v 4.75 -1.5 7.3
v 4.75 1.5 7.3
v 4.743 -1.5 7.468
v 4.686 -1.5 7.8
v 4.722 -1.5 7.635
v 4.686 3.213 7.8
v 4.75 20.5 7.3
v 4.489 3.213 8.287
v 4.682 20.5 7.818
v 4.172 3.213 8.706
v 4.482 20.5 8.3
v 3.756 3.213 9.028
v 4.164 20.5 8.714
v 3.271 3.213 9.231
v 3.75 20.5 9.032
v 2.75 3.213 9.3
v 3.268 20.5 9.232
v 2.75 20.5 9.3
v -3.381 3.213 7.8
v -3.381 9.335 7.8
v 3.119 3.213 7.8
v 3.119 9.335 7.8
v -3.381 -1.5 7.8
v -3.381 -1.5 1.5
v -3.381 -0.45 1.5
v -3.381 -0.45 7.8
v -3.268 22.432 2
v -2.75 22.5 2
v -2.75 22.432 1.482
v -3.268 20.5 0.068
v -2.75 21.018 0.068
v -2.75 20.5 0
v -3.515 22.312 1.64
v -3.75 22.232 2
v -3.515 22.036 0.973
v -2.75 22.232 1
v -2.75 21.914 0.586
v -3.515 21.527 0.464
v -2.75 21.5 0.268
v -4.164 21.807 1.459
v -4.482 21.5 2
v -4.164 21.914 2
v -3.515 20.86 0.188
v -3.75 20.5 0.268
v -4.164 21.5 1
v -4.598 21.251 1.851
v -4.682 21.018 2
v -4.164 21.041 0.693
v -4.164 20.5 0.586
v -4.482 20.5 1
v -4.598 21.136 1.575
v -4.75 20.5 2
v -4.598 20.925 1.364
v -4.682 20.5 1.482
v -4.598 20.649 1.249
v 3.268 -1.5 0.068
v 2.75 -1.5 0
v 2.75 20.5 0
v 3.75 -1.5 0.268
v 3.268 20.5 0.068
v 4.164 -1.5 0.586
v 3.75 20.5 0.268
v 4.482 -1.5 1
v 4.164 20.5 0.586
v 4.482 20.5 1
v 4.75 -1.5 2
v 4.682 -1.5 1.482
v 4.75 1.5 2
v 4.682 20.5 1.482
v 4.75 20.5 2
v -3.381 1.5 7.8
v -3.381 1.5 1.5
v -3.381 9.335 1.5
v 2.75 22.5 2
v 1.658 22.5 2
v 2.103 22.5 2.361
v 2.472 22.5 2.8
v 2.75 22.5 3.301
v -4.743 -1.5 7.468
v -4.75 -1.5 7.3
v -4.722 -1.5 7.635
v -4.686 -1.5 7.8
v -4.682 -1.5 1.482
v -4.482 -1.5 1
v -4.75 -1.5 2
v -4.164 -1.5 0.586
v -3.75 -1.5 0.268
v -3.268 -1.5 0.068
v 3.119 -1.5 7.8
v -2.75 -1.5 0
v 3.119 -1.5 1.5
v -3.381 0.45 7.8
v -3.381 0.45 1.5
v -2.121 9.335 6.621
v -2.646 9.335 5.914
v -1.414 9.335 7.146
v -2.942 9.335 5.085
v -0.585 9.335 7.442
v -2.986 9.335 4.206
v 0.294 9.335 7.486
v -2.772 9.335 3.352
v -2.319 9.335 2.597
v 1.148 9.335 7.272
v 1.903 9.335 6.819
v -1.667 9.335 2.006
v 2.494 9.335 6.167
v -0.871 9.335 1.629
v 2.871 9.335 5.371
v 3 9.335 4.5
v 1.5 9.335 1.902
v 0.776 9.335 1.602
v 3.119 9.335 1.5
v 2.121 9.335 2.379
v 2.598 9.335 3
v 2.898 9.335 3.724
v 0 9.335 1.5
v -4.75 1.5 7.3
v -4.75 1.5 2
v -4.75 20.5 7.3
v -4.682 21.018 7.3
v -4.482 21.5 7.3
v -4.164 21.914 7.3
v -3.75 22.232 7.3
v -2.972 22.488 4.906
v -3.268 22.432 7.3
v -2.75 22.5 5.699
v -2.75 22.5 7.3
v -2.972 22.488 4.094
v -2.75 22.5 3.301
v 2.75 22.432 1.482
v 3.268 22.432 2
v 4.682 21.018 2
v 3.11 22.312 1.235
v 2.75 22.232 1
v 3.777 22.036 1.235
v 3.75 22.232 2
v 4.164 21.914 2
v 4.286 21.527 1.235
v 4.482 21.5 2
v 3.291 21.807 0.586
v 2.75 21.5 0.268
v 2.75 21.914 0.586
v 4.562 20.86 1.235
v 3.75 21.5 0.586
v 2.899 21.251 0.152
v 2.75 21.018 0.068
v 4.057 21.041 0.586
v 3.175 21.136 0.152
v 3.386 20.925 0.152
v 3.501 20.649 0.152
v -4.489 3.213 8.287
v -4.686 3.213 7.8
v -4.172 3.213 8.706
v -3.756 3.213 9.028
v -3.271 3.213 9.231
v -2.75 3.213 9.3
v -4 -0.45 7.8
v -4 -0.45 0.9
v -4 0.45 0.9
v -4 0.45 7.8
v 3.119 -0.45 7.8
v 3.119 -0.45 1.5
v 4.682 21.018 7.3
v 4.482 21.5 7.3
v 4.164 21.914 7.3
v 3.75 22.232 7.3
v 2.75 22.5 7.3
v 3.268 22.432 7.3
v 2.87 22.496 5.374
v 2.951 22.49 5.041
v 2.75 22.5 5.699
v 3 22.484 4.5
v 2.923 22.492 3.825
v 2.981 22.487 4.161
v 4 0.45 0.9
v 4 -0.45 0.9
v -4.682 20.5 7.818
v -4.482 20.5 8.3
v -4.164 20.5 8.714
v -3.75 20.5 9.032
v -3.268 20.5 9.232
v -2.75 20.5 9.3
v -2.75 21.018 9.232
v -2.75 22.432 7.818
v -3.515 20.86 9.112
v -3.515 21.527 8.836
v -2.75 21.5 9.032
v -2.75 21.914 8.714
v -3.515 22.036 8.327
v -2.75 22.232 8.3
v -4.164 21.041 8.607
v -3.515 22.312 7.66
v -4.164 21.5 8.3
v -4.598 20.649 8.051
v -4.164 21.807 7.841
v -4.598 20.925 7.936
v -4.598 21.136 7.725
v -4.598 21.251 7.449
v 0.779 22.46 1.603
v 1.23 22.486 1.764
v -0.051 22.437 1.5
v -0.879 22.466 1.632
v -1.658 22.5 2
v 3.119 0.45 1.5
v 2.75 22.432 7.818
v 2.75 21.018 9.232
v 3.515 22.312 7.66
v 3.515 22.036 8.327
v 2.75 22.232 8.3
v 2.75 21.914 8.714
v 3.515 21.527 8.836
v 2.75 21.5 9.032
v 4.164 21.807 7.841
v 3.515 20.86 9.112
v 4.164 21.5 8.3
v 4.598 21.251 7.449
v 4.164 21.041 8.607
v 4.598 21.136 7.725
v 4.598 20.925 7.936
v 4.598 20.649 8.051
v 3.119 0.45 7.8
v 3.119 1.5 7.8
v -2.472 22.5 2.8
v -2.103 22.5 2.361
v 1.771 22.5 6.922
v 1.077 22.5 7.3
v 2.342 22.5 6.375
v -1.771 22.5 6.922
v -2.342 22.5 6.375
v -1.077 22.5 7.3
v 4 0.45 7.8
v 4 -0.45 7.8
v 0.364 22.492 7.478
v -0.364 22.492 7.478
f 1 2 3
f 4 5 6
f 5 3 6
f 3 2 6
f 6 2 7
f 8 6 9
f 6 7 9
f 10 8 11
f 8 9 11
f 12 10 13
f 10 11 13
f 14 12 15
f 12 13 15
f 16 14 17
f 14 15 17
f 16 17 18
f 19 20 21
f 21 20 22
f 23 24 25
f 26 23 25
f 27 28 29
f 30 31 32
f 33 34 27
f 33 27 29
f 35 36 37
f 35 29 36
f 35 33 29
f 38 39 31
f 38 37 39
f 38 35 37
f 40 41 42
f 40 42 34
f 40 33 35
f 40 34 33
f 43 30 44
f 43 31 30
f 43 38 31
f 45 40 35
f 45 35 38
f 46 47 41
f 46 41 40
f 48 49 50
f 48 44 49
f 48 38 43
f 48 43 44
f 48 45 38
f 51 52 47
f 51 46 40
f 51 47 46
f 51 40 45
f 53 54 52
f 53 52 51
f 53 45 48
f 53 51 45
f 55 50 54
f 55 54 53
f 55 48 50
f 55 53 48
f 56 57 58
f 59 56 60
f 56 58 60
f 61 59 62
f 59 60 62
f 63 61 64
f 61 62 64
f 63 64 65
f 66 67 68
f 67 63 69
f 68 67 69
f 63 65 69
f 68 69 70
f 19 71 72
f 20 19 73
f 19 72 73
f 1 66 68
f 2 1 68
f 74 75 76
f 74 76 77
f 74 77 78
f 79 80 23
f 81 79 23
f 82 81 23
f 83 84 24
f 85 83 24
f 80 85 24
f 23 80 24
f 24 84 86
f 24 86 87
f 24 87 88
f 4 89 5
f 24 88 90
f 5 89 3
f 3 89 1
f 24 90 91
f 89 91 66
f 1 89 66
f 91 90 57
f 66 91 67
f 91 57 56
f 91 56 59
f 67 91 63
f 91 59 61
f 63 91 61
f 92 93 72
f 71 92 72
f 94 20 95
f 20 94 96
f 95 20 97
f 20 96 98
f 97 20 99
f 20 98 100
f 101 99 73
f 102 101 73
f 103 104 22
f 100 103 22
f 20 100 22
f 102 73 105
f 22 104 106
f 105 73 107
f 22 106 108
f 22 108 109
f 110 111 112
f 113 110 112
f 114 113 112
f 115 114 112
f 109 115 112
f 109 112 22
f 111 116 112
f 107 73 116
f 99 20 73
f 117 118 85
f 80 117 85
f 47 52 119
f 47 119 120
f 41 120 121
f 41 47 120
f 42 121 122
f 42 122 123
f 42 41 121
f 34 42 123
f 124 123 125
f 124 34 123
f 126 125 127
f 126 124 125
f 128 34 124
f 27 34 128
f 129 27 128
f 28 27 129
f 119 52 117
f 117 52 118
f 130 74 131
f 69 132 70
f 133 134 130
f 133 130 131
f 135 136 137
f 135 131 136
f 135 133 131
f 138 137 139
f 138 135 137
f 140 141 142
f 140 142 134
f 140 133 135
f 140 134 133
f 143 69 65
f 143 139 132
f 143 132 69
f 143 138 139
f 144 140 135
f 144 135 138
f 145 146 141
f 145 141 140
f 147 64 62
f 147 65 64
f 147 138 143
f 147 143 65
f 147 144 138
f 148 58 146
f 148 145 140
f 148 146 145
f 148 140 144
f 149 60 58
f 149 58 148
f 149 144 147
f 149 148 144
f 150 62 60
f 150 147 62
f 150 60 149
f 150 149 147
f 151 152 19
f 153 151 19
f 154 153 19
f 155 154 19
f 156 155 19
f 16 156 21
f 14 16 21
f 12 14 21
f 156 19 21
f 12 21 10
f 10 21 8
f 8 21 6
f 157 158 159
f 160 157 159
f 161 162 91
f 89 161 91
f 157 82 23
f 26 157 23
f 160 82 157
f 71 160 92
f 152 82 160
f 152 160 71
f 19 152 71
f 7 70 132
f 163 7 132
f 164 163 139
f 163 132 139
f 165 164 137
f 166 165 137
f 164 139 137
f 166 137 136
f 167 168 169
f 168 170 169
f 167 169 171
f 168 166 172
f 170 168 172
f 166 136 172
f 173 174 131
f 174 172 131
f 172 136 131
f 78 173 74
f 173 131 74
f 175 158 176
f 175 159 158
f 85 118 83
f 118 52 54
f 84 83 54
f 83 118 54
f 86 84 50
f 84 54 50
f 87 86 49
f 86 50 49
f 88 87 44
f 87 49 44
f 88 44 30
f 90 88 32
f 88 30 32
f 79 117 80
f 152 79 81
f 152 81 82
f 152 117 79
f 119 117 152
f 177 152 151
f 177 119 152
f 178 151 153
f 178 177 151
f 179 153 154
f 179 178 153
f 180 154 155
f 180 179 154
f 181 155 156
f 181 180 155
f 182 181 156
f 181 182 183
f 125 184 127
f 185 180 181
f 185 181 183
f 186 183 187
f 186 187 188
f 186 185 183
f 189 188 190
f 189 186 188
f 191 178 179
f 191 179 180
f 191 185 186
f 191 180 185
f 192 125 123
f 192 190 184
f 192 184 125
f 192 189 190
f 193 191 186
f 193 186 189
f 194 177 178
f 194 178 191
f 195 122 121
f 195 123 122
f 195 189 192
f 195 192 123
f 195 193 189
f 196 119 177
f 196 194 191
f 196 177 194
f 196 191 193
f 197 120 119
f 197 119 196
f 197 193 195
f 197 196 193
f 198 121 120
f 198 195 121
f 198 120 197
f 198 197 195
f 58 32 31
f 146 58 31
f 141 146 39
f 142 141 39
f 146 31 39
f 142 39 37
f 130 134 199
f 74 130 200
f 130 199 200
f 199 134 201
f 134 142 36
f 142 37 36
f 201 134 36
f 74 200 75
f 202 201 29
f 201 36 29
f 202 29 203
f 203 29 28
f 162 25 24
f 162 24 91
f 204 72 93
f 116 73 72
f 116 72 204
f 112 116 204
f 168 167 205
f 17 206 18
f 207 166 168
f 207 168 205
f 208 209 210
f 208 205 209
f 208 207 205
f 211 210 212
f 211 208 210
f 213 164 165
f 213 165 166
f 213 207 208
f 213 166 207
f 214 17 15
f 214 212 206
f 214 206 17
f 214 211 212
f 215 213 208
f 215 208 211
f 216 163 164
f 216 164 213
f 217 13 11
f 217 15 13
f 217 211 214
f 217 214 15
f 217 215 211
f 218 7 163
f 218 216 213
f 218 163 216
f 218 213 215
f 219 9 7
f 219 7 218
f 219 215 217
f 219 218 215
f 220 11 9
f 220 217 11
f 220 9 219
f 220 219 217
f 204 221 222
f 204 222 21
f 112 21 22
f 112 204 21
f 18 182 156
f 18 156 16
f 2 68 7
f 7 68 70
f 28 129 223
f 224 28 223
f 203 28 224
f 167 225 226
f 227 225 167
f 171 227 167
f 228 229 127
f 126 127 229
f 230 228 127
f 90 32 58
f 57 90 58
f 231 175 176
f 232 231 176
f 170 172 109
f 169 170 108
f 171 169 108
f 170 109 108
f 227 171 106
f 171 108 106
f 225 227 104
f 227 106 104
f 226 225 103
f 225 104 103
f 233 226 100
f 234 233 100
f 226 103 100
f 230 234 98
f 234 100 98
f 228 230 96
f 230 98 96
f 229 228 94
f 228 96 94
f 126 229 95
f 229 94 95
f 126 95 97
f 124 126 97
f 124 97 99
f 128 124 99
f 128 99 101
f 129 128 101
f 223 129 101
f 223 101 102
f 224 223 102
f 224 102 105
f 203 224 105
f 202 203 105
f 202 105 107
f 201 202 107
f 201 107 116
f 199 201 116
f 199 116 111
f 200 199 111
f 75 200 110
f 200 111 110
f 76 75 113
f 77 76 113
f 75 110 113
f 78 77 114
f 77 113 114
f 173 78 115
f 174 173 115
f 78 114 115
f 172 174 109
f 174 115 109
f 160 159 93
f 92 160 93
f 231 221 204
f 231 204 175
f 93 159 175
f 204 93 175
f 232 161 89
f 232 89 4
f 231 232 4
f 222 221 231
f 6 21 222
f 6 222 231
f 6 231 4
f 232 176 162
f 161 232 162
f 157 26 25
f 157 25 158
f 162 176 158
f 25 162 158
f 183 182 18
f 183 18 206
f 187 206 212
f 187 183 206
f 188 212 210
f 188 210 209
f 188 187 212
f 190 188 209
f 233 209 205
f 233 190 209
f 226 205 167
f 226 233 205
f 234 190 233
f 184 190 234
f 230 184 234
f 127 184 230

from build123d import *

# Parameters (mm, degrees)
F0_W         = 1.3692331631
F0_H         = 7.834737435
F0_W_2       = 6.5
F0_H_2       = 0.9
F0_W_3       = 0.6192331631
F0_H_3       = 1.05
F0_H_4       = 13.165262565
F0_W_4       = 0.8807668369
F0_W_5       = 1.6307668369
F1_DEPTH     = 0.9
F2_DEPTH     = 1.5
F3_DEPTH     = 7.8
F5_W         = 9.5
F5_H         = 19.2867757659
F6_DEPTH     = 1.5
F7_R         = 3
F8_DEPTH     = 22.501
F9_T1_DEPTH  = 5.3
F9_T3_DEPTH  = 5.5
F9_T5_DEPTH  = 22.2867757659
F9_T7_DEPTH  = 27
F9_S11_W     = 2
F9_S11_H     = 2
F9_T12_DEPTH = 2
F9_S17_W     = 2
F9_S17_H     = 2
F9_T18_DEPTH = 2
F9_S23_W     = 2
F9_S23_H     = 2
F9_T24_DEPTH = 2
F9_S29_W     = 2
F9_S29_H     = 2
F9_T30_DEPTH = 2


# Not quite as in the source:
# - a fillet or chamfer that OpenCascade refuses, or shapes differently, is made with other operations: its cross-section is extruded or revolved along the edge and cut away or added
# - a feature names something its author has since deleted; it is built from what else it names


with BuildPart() as f1:
    # F0 (on Top) → F1 (new body)
    with BuildSketch(Plane.XY):
        Polygon((-4.75, 1.5), (-4.75, -1.5), (-3.3807668369, -1.5), (-3.3807668369, -0.45), (-4, -0.45), (-4, 0.45), (-3.3807668369, 0.45), (-3.3807668369, 1.5), align=None)
        Polygon((-3.3807668369, -0.45), (-3.3807668369, -1.5), (-3.1192331631, -1.5), (3.1192331631, -1.5), (3.1192331631, -0.45), align=None)
        with Locations((-4.0653834185, 5.4173687175)):
            Rectangle(F0_W, F0_H)
        with Locations((-0.1307668369, 0)):
            Rectangle(F0_W_2, F0_H_2)
        with Locations((-3.6903834185, 0)):
            Rectangle(F0_W_3, F0_H_2)
        with Locations((-0.1307668369, 5.4173687175)):
            Rectangle(F0_W_2, F0_H)
        with Locations((-0.1307668369, 0.975)):
            Rectangle(F0_W_2, F0_H_3)
        with Locations((-4.0653834185, 15.9173687175)):
            Rectangle(F0_W, F0_H_4)
        Polygon((3.1192331631, -0.45), (3.1192331631, -1.5), (3.3807668369, -1.5), (4.75, -1.5), (4.75, 1.5), (3.1192331631, 1.5), (3.1192331631, 0.45), (4, 0.45), (4, -0.45), align=None)
        with Locations((3.5596165815, 0)):
            Rectangle(F0_W_4, F0_H_2)
        with Locations((3.9346165815, 5.4173687175)):
            Rectangle(F0_W_5, F0_H)
        with Locations((-0.1307668369, 15.9173687175)):
            Rectangle(F0_W_2, F0_H_4)
        with Locations((3.9346165815, 15.9173687175)):
            Rectangle(F0_W_5, F0_H_4)
    extrude(amount=F1_DEPTH)

    # F0 (on Top) → F2 (join)
    with BuildSketch(Plane.XY):
        Polygon((-3.3807668369, -0.45), (-3.3807668369, -1.5), (-3.1192331631, -1.5), (3.1192331631, -1.5), (3.1192331631, -0.45), align=None)
        Polygon((3.1192331631, -0.45), (3.1192331631, -1.5), (3.3807668369, -1.5), (4.75, -1.5), (4.75, 1.5), (3.1192331631, 1.5), (3.1192331631, 0.45), (4, 0.45), (4, -0.45), align=None)
        Polygon((-4.75, 1.5), (-4.75, -1.5), (-3.3807668369, -1.5), (-3.3807668369, -0.45), (-4, -0.45), (-4, 0.45), (-3.3807668369, 0.45), (-3.3807668369, 1.5), align=None)
        with Locations((-0.1307668369, 0.975)):
            Rectangle(F0_W_2, F0_H_3)
        with Locations((-4.0653834185, 5.4173687175)):
            Rectangle(F0_W, F0_H)
        with Locations((3.9346165815, 5.4173687175)):
            Rectangle(F0_W_5, F0_H)
        with Locations((-0.1307668369, 5.4173687175)):
            Rectangle(F0_W_2, F0_H)
        with Locations((-4.0653834185, 15.9173687175)):
            Rectangle(F0_W, F0_H_4)
        with Locations((-0.1307668369, 15.9173687175)):
            Rectangle(F0_W_2, F0_H_4)
        with Locations((3.9346165815, 15.9173687175)):
            Rectangle(F0_W_5, F0_H_4)
    extrude(amount=F2_DEPTH)

    # F0 (on Top) → F3 (join)
    with BuildSketch(Plane.XY):
        Polygon((-4.75, 1.5), (-4.75, -1.5), (-3.3807668369, -1.5), (-3.3807668369, -0.45), (-4, -0.45), (-4, 0.45), (-3.3807668369, 0.45), (-3.3807668369, 1.5), align=None)
        Polygon((3.1192331631, -0.45), (3.1192331631, -1.5), (3.3807668369, -1.5), (4.75, -1.5), (4.75, 1.5), (3.1192331631, 1.5), (3.1192331631, 0.45), (4, 0.45), (4, -0.45), align=None)
        with Locations((-4.0653834185, 5.4173687175)):
            Rectangle(F0_W, F0_H)
        with Locations((3.9346165815, 5.4173687175)):
            Rectangle(F0_W_5, F0_H)
        with Locations((-4.0653834185, 15.9173687175)):
            Rectangle(F0_W, F0_H_4)
        with Locations((-0.1307668369, 15.9173687175)):
            Rectangle(F0_W_2, F0_H_4)
        with Locations((3.9346165815, 15.9173687175)):
            Rectangle(F0_W_5, F0_H_4)
    extrude(amount=F3_DEPTH)

    # F5 (on offset) → F6 (join)
    with BuildSketch(Plane.XY.offset(7.8)):
        with Locations((0, 12.856612117)):
            Rectangle(F5_W, F5_H)
    extrude(amount=F6_DEPTH)

    # F7 (on Front) → F8 (cut, through all)
    with BuildSketch(Plane.XZ):
        with Locations((0, 4.5)):
            Circle(F7_R)
    extrude(amount=-F8_DEPTH, mode=Mode.SUBTRACT)

    # F9: fillet of radius 2 on 8 edges, made by hand

    # F9_s2 → F9_t1 (cut)
    with BuildSketch(Plane.XY.offset(2)):
        with BuildLine():
            ThreePointArc((4.75, 20.5), (4.1642135624, 21.9142135624), (2.75, 22.5))
            Line((2.75, 22.5), (4.75, 22.5))
            Line((4.75, 22.5), (4.75, 20.5))
        make_face()
        with BuildLine():
            ThreePointArc((-4.75, 20.5), (-4.1642135624, 21.9142135624), (-2.75, 22.5))
            Line((-2.75, 22.5), (-4.75, 22.5))
            Line((-4.75, 22.5), (-4.75, 20.5))
        make_face()
    extrude(amount=F9_T1_DEPTH, mode=Mode.SUBTRACT)

    # F9_s4 → F9_t3 (cut)
    with BuildSketch(Plane.YZ.offset(-2.75)):
        with BuildLine():
            ThreePointArc((20.5, 9.3), (21.9142135624, 8.7142135624), (22.5, 7.3))
            Line((22.5, 7.3), (22.5, 9.3))
            Line((22.5, 9.3), (20.5, 9.3))
        make_face()
        with BuildLine():
            ThreePointArc((20.5, 0), (21.9142135624, 0.5857864376), (22.5, 2))
            Line((22.5, 2), (22.5, 0))
            Line((22.5, 0), (20.5, 0))
        make_face()
    extrude(amount=F9_T3_DEPTH, mode=Mode.SUBTRACT)

    # F9_s6 → F9_t5 (cut)
    with BuildSketch(Plane.XZ.offset(-20.5)):
        with BuildLine():
            ThreePointArc((4.75, 7.3), (4.1642135624, 8.7142135624), (2.75, 9.3))
            Line((2.75, 9.3), (4.75, 9.3))
            Line((4.75, 9.3), (4.75, 7.3))
        make_face()
        with BuildLine():
            ThreePointArc((-4.75, 7.3), (-4.1642135624, 8.7142135624), (-2.75, 9.3))
            Line((-2.75, 9.3), (-4.75, 9.3))
            Line((-4.75, 9.3), (-4.75, 7.3))
        make_face()
    extrude(amount=F9_T5_DEPTH, mode=Mode.SUBTRACT)

    # F9_s8 → F9_t7 (cut)
    with BuildSketch(Plane.XZ.offset(-20.5)):
        with BuildLine():
            ThreePointArc((2.75, 0), (4.1642135624, 0.5857864376), (4.75, 2))
            Line((4.75, 2), (4.75, 0))
            Line((4.75, 0), (2.75, 0))
        make_face()
        with BuildLine():
            ThreePointArc((-4.75, 2), (-4.1642135624, 0.5857864376), (-2.75, 0))
            Line((-2.75, 0), (-4.75, 0))
            Line((-4.75, 0), (-4.75, 2))
        make_face()
    extrude(amount=F9_T7_DEPTH, mode=Mode.SUBTRACT)


with BuildPart() as f9_tool10:
    # F9_s11 → F9_t12 (new body)
    with BuildSketch(Plane.YZ.offset(2.75)):
        with Locations((21.5, 8.3)):
            Rectangle(F9_S11_W, F9_S11_H)
    extrude(amount=F9_T12_DEPTH)

    # F9_s13 → F9_t14 (revolve, cut)
    with BuildSketch(Plane(origin=(2.75, 20.5, 7.3), x_dir=(0, -0.7071067812, -0.7071067812), z_dir=(0, -0.7071067812, 0.7071067812))):
        with BuildLine():
            ThreePointArc((0, -2), (2, 0), (0, 2))
            Line((0, 2), (0, -2))
        make_face()
    revolve(axis=Axis((2.75, 20.5, 7.3), (1, 0, 0)), mode=Mode.SUBTRACT)


with BuildPart() as f1_1:
    add(f1.part)

    # F9_t9: cut F9_tool10
    add(f9_tool10.part, mode=Mode.SUBTRACT)


with BuildPart() as f9_tool16:
    # F9_s17 → F9_t18 (new body)
    with BuildSketch(Plane.XY.offset(2)):
        with Locations((3.75, 21.5)):
            Rectangle(F9_S17_W, F9_S17_H)
    extrude(amount=-F9_T18_DEPTH)

    # F9_s19 → F9_t20 (revolve, cut)
    with BuildSketch(Plane(origin=(2.75, 20.5, 2), x_dir=(-0.7071067812, -0.7071067812, 0), z_dir=(0.7071067812, -0.7071067812, 0))):
        with BuildLine():
            ThreePointArc((0, -2), (2, 0), (0, 2))
            Line((0, 2), (0, -2))
        make_face()
    revolve(axis=Axis((2.75, 20.5, 2), (0, 0, -1)), mode=Mode.SUBTRACT)


with BuildPart() as f1_2:
    add(f1_1.part)

    # F9_t15: cut F9_tool16
    add(f9_tool16.part, mode=Mode.SUBTRACT)


with BuildPart() as f9_tool22:
    # F9_s23 → F9_t24 (new body)
    with BuildSketch(Plane.YZ.offset(-2.75)):
        with Locations((21.5, 8.3)):
            Rectangle(F9_S23_W, F9_S23_H)
    extrude(amount=-F9_T24_DEPTH)

    # F9_s25 → F9_t26 (revolve, cut)
    with BuildSketch(Plane(origin=(-2.75, 20.5, 7.3), x_dir=(0, -0.7071067812, -0.7071067812), z_dir=(0, 0.7071067812, -0.7071067812))):
        with BuildLine():
            ThreePointArc((0, -2), (2, 0), (0, 2))
            Line((0, 2), (0, -2))
        make_face()
    revolve(axis=Axis((-2.75, 20.5, 7.3), (-1, 0, 0)), mode=Mode.SUBTRACT)


with BuildPart() as f1_3:
    add(f1_2.part)

    # F9_t21: cut F9_tool22
    add(f9_tool22.part, mode=Mode.SUBTRACT)


with BuildPart() as f9_tool28:
    # F9_s29 → F9_t30 (new body)
    with BuildSketch(Plane.YZ.offset(-2.75)):
        with Locations((21.5, 1)):
            Rectangle(F9_S29_W, F9_S29_H)
    extrude(amount=-F9_T30_DEPTH)

    # F9_s31 → F9_t32 (revolve, cut)
    with BuildSketch(Plane(origin=(-2.75, 20.5, 2), x_dir=(0, -0.7071067812, 0.7071067812), z_dir=(0, -0.7071067812, -0.7071067812))):
        with BuildLine():
            ThreePointArc((0, -2), (2, 0), (0, 2))
            Line((0, 2), (0, -2))
        make_face()
    revolve(axis=Axis((-2.75, 20.5, 2), (-1, 0, 0)), mode=Mode.SUBTRACT)


with BuildPart() as f1_4:
    add(f1_3.part)

    # F9_t27: cut F9_tool28
    add(f9_tool28.part, mode=Mode.SUBTRACT)


solid = f1_4.part
